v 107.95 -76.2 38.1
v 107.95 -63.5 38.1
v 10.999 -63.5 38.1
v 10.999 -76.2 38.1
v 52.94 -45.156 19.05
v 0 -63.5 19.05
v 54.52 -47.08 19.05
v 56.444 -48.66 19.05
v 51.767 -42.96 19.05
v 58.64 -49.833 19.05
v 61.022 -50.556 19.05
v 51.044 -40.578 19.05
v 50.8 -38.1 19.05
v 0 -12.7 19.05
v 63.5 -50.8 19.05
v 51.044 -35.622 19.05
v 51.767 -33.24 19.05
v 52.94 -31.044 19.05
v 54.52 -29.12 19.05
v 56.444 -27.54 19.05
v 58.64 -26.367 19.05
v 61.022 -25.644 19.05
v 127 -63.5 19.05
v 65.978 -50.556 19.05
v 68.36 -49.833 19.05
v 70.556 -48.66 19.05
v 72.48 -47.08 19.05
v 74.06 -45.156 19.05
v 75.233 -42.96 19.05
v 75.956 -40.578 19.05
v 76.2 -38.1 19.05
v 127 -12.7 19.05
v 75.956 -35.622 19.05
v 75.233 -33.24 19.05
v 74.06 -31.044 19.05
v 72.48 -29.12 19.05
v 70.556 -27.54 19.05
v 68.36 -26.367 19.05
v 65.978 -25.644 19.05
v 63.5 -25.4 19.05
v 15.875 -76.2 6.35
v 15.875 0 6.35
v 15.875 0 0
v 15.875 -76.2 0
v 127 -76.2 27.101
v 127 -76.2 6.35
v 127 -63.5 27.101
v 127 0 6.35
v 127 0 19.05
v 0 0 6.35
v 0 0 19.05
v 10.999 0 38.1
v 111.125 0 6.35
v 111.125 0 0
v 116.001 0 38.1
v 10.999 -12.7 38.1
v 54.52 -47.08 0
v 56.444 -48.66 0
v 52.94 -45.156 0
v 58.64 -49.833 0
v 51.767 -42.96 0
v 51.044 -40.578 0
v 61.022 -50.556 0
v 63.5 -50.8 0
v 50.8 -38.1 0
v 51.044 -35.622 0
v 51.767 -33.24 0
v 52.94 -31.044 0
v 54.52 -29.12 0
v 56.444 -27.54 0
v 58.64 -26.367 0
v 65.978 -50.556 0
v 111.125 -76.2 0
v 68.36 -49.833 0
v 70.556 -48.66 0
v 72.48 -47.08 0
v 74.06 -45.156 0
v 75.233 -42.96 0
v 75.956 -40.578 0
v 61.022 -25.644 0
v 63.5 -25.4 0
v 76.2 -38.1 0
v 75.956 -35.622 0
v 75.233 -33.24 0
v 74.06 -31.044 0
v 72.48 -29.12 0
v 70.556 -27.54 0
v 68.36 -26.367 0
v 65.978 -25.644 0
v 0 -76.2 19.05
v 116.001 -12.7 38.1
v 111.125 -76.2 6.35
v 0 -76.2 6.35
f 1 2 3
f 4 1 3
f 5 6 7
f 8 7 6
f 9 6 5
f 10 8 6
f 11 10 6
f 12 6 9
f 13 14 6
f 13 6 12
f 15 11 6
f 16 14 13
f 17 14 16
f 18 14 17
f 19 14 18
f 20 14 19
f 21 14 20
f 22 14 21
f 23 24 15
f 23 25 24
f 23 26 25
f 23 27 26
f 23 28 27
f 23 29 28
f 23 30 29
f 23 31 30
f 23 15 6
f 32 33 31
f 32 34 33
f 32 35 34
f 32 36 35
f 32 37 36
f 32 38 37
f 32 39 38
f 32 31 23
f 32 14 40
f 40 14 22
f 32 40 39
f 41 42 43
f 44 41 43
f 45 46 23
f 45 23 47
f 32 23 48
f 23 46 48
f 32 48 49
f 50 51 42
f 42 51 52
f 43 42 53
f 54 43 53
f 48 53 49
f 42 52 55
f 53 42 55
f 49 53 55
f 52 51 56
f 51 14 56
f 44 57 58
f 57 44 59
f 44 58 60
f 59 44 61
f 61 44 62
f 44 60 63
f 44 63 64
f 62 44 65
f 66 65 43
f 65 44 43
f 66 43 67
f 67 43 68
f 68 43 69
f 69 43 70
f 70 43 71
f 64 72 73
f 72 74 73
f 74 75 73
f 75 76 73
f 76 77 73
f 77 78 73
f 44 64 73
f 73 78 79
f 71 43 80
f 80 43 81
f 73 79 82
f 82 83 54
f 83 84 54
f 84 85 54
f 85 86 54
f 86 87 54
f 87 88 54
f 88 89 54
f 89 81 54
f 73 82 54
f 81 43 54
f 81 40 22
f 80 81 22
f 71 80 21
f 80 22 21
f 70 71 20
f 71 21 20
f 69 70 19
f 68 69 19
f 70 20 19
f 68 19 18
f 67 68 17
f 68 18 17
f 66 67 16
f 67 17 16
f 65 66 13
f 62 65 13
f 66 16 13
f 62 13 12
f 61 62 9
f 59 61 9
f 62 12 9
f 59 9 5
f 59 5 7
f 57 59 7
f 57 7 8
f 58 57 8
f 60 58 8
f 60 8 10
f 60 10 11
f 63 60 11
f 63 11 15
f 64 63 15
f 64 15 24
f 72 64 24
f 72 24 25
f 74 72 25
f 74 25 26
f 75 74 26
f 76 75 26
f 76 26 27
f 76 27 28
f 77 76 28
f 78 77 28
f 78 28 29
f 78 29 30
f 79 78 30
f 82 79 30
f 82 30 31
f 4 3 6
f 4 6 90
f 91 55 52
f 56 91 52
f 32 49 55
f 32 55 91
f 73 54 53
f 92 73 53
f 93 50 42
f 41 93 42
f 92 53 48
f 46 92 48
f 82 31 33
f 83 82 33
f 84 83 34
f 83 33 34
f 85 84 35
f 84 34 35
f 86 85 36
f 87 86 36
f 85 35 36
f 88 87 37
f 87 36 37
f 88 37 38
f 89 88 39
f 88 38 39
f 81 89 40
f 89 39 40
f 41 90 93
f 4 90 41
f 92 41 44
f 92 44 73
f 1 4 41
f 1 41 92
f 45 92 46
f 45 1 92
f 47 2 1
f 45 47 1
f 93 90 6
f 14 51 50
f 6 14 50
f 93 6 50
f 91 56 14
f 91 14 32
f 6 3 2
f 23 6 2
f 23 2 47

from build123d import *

# Parameters (mm, degrees)
F1_DEPTH    = 76.2
F2_W        = 127
F2_H        = 50.8
F3_DEPTH    = 19.05
F4_C1_SIZE2 = 10.9985226281
F4_C1_SIZE  = 19.05
F4_C2_SIZE2 = 10.9985226281
F4_C2_SIZE  = 19.05
F4_C3_SIZE2 = 19.05
F4_C3_SIZE  = 10.9985226281
F4_C4_SIZE2 = 19.05
F4_C4_SIZE  = 10.9985226281
F6_DEPTH    = 56.642


with BuildPart() as f1:
    # F0 (on Front) → F1 (new body)
    with BuildSketch(Plane.XZ):
        Polygon((15.875, 6.35), (15.875, 0), (111.125, 0), (111.125, 6.35), (127, 6.35), (127, 19.05), (127, 38.1), (0, 38.1), (0, 19.05), (0, 6.35), align=None)
    extrude(amount=F1_DEPTH)

    # F2 (on face) → F3 (cut)
    with BuildSketch(Plane.XY.offset(38.1)):
        with Locations((63.5, -38.1)):
            Rectangle(F2_W, F2_H)
    extrude(amount=-F3_DEPTH, mode=Mode.SUBTRACT)

    # F4: chamfer of 19.05 x 10.9985226281 on 4 edges, made by hand

    # F4_c1
    f4_c1_edges = [f1.edges().sort_by_distance(p)[0] for p in [
        (0, -69.85, 38.1),
    ]]
    f4_c1_side = f1.faces().sort_by_distance((0, -69.85, 37.8800295474))[0]
    chamfer(f4_c1_edges, length=F4_C1_SIZE, length2=F4_C1_SIZE2, reference=f4_c1_side)

    # F4_c2
    f4_c2_edges = [f1.edges().sort_by_distance(p)[0] for p in [
        (0, -6.35, 38.1),
    ]]
    f4_c2_side = f1.faces().sort_by_distance((0, -6.35, 37.8800295474))[0]
    chamfer(f4_c2_edges, length=F4_C2_SIZE, length2=F4_C2_SIZE2, reference=f4_c2_side)

    # F4_c3
    f4_c3_edges = [f1.edges().sort_by_distance(p)[0] for p in [
        (127, -6.35, 38.1),
    ]]
    f4_c3_side = f1.faces().sort_by_distance((126.7800295474, -6.35, 38.1))[0]
    chamfer(f4_c3_edges, length=F4_C3_SIZE, length2=F4_C3_SIZE2, reference=f4_c3_side)

    # F4_c4
    f4_c4_edges = [f1.edges().sort_by_distance(p)[0] for p in [
        (127, -69.85, 38.1),
    ]]
    f4_c4_side = f1.faces().sort_by_distance((127, -69.85, 37.8800295474))[0]
    chamfer(f4_c4_edges, length=F4_C4_SIZE, length2=F4_C4_SIZE2, reference=f4_c4_side)

    # F5 (on face) → F6 (cut)
    with BuildSketch(Plane.XY.offset(19.05)):
        with BuildLine():
            ThreePointArc((76.2, -38.1), (72.4802561211, -29.1197438789), (63.5, -25.4))
            ThreePointArc((63.5, -25.4), (54.5197438789, -47.0802561211), (76.2, -38.1))
        make_face()
    extrude(amount=-F6_DEPTH, mode=Mode.SUBTRACT)


solid = f1.part
